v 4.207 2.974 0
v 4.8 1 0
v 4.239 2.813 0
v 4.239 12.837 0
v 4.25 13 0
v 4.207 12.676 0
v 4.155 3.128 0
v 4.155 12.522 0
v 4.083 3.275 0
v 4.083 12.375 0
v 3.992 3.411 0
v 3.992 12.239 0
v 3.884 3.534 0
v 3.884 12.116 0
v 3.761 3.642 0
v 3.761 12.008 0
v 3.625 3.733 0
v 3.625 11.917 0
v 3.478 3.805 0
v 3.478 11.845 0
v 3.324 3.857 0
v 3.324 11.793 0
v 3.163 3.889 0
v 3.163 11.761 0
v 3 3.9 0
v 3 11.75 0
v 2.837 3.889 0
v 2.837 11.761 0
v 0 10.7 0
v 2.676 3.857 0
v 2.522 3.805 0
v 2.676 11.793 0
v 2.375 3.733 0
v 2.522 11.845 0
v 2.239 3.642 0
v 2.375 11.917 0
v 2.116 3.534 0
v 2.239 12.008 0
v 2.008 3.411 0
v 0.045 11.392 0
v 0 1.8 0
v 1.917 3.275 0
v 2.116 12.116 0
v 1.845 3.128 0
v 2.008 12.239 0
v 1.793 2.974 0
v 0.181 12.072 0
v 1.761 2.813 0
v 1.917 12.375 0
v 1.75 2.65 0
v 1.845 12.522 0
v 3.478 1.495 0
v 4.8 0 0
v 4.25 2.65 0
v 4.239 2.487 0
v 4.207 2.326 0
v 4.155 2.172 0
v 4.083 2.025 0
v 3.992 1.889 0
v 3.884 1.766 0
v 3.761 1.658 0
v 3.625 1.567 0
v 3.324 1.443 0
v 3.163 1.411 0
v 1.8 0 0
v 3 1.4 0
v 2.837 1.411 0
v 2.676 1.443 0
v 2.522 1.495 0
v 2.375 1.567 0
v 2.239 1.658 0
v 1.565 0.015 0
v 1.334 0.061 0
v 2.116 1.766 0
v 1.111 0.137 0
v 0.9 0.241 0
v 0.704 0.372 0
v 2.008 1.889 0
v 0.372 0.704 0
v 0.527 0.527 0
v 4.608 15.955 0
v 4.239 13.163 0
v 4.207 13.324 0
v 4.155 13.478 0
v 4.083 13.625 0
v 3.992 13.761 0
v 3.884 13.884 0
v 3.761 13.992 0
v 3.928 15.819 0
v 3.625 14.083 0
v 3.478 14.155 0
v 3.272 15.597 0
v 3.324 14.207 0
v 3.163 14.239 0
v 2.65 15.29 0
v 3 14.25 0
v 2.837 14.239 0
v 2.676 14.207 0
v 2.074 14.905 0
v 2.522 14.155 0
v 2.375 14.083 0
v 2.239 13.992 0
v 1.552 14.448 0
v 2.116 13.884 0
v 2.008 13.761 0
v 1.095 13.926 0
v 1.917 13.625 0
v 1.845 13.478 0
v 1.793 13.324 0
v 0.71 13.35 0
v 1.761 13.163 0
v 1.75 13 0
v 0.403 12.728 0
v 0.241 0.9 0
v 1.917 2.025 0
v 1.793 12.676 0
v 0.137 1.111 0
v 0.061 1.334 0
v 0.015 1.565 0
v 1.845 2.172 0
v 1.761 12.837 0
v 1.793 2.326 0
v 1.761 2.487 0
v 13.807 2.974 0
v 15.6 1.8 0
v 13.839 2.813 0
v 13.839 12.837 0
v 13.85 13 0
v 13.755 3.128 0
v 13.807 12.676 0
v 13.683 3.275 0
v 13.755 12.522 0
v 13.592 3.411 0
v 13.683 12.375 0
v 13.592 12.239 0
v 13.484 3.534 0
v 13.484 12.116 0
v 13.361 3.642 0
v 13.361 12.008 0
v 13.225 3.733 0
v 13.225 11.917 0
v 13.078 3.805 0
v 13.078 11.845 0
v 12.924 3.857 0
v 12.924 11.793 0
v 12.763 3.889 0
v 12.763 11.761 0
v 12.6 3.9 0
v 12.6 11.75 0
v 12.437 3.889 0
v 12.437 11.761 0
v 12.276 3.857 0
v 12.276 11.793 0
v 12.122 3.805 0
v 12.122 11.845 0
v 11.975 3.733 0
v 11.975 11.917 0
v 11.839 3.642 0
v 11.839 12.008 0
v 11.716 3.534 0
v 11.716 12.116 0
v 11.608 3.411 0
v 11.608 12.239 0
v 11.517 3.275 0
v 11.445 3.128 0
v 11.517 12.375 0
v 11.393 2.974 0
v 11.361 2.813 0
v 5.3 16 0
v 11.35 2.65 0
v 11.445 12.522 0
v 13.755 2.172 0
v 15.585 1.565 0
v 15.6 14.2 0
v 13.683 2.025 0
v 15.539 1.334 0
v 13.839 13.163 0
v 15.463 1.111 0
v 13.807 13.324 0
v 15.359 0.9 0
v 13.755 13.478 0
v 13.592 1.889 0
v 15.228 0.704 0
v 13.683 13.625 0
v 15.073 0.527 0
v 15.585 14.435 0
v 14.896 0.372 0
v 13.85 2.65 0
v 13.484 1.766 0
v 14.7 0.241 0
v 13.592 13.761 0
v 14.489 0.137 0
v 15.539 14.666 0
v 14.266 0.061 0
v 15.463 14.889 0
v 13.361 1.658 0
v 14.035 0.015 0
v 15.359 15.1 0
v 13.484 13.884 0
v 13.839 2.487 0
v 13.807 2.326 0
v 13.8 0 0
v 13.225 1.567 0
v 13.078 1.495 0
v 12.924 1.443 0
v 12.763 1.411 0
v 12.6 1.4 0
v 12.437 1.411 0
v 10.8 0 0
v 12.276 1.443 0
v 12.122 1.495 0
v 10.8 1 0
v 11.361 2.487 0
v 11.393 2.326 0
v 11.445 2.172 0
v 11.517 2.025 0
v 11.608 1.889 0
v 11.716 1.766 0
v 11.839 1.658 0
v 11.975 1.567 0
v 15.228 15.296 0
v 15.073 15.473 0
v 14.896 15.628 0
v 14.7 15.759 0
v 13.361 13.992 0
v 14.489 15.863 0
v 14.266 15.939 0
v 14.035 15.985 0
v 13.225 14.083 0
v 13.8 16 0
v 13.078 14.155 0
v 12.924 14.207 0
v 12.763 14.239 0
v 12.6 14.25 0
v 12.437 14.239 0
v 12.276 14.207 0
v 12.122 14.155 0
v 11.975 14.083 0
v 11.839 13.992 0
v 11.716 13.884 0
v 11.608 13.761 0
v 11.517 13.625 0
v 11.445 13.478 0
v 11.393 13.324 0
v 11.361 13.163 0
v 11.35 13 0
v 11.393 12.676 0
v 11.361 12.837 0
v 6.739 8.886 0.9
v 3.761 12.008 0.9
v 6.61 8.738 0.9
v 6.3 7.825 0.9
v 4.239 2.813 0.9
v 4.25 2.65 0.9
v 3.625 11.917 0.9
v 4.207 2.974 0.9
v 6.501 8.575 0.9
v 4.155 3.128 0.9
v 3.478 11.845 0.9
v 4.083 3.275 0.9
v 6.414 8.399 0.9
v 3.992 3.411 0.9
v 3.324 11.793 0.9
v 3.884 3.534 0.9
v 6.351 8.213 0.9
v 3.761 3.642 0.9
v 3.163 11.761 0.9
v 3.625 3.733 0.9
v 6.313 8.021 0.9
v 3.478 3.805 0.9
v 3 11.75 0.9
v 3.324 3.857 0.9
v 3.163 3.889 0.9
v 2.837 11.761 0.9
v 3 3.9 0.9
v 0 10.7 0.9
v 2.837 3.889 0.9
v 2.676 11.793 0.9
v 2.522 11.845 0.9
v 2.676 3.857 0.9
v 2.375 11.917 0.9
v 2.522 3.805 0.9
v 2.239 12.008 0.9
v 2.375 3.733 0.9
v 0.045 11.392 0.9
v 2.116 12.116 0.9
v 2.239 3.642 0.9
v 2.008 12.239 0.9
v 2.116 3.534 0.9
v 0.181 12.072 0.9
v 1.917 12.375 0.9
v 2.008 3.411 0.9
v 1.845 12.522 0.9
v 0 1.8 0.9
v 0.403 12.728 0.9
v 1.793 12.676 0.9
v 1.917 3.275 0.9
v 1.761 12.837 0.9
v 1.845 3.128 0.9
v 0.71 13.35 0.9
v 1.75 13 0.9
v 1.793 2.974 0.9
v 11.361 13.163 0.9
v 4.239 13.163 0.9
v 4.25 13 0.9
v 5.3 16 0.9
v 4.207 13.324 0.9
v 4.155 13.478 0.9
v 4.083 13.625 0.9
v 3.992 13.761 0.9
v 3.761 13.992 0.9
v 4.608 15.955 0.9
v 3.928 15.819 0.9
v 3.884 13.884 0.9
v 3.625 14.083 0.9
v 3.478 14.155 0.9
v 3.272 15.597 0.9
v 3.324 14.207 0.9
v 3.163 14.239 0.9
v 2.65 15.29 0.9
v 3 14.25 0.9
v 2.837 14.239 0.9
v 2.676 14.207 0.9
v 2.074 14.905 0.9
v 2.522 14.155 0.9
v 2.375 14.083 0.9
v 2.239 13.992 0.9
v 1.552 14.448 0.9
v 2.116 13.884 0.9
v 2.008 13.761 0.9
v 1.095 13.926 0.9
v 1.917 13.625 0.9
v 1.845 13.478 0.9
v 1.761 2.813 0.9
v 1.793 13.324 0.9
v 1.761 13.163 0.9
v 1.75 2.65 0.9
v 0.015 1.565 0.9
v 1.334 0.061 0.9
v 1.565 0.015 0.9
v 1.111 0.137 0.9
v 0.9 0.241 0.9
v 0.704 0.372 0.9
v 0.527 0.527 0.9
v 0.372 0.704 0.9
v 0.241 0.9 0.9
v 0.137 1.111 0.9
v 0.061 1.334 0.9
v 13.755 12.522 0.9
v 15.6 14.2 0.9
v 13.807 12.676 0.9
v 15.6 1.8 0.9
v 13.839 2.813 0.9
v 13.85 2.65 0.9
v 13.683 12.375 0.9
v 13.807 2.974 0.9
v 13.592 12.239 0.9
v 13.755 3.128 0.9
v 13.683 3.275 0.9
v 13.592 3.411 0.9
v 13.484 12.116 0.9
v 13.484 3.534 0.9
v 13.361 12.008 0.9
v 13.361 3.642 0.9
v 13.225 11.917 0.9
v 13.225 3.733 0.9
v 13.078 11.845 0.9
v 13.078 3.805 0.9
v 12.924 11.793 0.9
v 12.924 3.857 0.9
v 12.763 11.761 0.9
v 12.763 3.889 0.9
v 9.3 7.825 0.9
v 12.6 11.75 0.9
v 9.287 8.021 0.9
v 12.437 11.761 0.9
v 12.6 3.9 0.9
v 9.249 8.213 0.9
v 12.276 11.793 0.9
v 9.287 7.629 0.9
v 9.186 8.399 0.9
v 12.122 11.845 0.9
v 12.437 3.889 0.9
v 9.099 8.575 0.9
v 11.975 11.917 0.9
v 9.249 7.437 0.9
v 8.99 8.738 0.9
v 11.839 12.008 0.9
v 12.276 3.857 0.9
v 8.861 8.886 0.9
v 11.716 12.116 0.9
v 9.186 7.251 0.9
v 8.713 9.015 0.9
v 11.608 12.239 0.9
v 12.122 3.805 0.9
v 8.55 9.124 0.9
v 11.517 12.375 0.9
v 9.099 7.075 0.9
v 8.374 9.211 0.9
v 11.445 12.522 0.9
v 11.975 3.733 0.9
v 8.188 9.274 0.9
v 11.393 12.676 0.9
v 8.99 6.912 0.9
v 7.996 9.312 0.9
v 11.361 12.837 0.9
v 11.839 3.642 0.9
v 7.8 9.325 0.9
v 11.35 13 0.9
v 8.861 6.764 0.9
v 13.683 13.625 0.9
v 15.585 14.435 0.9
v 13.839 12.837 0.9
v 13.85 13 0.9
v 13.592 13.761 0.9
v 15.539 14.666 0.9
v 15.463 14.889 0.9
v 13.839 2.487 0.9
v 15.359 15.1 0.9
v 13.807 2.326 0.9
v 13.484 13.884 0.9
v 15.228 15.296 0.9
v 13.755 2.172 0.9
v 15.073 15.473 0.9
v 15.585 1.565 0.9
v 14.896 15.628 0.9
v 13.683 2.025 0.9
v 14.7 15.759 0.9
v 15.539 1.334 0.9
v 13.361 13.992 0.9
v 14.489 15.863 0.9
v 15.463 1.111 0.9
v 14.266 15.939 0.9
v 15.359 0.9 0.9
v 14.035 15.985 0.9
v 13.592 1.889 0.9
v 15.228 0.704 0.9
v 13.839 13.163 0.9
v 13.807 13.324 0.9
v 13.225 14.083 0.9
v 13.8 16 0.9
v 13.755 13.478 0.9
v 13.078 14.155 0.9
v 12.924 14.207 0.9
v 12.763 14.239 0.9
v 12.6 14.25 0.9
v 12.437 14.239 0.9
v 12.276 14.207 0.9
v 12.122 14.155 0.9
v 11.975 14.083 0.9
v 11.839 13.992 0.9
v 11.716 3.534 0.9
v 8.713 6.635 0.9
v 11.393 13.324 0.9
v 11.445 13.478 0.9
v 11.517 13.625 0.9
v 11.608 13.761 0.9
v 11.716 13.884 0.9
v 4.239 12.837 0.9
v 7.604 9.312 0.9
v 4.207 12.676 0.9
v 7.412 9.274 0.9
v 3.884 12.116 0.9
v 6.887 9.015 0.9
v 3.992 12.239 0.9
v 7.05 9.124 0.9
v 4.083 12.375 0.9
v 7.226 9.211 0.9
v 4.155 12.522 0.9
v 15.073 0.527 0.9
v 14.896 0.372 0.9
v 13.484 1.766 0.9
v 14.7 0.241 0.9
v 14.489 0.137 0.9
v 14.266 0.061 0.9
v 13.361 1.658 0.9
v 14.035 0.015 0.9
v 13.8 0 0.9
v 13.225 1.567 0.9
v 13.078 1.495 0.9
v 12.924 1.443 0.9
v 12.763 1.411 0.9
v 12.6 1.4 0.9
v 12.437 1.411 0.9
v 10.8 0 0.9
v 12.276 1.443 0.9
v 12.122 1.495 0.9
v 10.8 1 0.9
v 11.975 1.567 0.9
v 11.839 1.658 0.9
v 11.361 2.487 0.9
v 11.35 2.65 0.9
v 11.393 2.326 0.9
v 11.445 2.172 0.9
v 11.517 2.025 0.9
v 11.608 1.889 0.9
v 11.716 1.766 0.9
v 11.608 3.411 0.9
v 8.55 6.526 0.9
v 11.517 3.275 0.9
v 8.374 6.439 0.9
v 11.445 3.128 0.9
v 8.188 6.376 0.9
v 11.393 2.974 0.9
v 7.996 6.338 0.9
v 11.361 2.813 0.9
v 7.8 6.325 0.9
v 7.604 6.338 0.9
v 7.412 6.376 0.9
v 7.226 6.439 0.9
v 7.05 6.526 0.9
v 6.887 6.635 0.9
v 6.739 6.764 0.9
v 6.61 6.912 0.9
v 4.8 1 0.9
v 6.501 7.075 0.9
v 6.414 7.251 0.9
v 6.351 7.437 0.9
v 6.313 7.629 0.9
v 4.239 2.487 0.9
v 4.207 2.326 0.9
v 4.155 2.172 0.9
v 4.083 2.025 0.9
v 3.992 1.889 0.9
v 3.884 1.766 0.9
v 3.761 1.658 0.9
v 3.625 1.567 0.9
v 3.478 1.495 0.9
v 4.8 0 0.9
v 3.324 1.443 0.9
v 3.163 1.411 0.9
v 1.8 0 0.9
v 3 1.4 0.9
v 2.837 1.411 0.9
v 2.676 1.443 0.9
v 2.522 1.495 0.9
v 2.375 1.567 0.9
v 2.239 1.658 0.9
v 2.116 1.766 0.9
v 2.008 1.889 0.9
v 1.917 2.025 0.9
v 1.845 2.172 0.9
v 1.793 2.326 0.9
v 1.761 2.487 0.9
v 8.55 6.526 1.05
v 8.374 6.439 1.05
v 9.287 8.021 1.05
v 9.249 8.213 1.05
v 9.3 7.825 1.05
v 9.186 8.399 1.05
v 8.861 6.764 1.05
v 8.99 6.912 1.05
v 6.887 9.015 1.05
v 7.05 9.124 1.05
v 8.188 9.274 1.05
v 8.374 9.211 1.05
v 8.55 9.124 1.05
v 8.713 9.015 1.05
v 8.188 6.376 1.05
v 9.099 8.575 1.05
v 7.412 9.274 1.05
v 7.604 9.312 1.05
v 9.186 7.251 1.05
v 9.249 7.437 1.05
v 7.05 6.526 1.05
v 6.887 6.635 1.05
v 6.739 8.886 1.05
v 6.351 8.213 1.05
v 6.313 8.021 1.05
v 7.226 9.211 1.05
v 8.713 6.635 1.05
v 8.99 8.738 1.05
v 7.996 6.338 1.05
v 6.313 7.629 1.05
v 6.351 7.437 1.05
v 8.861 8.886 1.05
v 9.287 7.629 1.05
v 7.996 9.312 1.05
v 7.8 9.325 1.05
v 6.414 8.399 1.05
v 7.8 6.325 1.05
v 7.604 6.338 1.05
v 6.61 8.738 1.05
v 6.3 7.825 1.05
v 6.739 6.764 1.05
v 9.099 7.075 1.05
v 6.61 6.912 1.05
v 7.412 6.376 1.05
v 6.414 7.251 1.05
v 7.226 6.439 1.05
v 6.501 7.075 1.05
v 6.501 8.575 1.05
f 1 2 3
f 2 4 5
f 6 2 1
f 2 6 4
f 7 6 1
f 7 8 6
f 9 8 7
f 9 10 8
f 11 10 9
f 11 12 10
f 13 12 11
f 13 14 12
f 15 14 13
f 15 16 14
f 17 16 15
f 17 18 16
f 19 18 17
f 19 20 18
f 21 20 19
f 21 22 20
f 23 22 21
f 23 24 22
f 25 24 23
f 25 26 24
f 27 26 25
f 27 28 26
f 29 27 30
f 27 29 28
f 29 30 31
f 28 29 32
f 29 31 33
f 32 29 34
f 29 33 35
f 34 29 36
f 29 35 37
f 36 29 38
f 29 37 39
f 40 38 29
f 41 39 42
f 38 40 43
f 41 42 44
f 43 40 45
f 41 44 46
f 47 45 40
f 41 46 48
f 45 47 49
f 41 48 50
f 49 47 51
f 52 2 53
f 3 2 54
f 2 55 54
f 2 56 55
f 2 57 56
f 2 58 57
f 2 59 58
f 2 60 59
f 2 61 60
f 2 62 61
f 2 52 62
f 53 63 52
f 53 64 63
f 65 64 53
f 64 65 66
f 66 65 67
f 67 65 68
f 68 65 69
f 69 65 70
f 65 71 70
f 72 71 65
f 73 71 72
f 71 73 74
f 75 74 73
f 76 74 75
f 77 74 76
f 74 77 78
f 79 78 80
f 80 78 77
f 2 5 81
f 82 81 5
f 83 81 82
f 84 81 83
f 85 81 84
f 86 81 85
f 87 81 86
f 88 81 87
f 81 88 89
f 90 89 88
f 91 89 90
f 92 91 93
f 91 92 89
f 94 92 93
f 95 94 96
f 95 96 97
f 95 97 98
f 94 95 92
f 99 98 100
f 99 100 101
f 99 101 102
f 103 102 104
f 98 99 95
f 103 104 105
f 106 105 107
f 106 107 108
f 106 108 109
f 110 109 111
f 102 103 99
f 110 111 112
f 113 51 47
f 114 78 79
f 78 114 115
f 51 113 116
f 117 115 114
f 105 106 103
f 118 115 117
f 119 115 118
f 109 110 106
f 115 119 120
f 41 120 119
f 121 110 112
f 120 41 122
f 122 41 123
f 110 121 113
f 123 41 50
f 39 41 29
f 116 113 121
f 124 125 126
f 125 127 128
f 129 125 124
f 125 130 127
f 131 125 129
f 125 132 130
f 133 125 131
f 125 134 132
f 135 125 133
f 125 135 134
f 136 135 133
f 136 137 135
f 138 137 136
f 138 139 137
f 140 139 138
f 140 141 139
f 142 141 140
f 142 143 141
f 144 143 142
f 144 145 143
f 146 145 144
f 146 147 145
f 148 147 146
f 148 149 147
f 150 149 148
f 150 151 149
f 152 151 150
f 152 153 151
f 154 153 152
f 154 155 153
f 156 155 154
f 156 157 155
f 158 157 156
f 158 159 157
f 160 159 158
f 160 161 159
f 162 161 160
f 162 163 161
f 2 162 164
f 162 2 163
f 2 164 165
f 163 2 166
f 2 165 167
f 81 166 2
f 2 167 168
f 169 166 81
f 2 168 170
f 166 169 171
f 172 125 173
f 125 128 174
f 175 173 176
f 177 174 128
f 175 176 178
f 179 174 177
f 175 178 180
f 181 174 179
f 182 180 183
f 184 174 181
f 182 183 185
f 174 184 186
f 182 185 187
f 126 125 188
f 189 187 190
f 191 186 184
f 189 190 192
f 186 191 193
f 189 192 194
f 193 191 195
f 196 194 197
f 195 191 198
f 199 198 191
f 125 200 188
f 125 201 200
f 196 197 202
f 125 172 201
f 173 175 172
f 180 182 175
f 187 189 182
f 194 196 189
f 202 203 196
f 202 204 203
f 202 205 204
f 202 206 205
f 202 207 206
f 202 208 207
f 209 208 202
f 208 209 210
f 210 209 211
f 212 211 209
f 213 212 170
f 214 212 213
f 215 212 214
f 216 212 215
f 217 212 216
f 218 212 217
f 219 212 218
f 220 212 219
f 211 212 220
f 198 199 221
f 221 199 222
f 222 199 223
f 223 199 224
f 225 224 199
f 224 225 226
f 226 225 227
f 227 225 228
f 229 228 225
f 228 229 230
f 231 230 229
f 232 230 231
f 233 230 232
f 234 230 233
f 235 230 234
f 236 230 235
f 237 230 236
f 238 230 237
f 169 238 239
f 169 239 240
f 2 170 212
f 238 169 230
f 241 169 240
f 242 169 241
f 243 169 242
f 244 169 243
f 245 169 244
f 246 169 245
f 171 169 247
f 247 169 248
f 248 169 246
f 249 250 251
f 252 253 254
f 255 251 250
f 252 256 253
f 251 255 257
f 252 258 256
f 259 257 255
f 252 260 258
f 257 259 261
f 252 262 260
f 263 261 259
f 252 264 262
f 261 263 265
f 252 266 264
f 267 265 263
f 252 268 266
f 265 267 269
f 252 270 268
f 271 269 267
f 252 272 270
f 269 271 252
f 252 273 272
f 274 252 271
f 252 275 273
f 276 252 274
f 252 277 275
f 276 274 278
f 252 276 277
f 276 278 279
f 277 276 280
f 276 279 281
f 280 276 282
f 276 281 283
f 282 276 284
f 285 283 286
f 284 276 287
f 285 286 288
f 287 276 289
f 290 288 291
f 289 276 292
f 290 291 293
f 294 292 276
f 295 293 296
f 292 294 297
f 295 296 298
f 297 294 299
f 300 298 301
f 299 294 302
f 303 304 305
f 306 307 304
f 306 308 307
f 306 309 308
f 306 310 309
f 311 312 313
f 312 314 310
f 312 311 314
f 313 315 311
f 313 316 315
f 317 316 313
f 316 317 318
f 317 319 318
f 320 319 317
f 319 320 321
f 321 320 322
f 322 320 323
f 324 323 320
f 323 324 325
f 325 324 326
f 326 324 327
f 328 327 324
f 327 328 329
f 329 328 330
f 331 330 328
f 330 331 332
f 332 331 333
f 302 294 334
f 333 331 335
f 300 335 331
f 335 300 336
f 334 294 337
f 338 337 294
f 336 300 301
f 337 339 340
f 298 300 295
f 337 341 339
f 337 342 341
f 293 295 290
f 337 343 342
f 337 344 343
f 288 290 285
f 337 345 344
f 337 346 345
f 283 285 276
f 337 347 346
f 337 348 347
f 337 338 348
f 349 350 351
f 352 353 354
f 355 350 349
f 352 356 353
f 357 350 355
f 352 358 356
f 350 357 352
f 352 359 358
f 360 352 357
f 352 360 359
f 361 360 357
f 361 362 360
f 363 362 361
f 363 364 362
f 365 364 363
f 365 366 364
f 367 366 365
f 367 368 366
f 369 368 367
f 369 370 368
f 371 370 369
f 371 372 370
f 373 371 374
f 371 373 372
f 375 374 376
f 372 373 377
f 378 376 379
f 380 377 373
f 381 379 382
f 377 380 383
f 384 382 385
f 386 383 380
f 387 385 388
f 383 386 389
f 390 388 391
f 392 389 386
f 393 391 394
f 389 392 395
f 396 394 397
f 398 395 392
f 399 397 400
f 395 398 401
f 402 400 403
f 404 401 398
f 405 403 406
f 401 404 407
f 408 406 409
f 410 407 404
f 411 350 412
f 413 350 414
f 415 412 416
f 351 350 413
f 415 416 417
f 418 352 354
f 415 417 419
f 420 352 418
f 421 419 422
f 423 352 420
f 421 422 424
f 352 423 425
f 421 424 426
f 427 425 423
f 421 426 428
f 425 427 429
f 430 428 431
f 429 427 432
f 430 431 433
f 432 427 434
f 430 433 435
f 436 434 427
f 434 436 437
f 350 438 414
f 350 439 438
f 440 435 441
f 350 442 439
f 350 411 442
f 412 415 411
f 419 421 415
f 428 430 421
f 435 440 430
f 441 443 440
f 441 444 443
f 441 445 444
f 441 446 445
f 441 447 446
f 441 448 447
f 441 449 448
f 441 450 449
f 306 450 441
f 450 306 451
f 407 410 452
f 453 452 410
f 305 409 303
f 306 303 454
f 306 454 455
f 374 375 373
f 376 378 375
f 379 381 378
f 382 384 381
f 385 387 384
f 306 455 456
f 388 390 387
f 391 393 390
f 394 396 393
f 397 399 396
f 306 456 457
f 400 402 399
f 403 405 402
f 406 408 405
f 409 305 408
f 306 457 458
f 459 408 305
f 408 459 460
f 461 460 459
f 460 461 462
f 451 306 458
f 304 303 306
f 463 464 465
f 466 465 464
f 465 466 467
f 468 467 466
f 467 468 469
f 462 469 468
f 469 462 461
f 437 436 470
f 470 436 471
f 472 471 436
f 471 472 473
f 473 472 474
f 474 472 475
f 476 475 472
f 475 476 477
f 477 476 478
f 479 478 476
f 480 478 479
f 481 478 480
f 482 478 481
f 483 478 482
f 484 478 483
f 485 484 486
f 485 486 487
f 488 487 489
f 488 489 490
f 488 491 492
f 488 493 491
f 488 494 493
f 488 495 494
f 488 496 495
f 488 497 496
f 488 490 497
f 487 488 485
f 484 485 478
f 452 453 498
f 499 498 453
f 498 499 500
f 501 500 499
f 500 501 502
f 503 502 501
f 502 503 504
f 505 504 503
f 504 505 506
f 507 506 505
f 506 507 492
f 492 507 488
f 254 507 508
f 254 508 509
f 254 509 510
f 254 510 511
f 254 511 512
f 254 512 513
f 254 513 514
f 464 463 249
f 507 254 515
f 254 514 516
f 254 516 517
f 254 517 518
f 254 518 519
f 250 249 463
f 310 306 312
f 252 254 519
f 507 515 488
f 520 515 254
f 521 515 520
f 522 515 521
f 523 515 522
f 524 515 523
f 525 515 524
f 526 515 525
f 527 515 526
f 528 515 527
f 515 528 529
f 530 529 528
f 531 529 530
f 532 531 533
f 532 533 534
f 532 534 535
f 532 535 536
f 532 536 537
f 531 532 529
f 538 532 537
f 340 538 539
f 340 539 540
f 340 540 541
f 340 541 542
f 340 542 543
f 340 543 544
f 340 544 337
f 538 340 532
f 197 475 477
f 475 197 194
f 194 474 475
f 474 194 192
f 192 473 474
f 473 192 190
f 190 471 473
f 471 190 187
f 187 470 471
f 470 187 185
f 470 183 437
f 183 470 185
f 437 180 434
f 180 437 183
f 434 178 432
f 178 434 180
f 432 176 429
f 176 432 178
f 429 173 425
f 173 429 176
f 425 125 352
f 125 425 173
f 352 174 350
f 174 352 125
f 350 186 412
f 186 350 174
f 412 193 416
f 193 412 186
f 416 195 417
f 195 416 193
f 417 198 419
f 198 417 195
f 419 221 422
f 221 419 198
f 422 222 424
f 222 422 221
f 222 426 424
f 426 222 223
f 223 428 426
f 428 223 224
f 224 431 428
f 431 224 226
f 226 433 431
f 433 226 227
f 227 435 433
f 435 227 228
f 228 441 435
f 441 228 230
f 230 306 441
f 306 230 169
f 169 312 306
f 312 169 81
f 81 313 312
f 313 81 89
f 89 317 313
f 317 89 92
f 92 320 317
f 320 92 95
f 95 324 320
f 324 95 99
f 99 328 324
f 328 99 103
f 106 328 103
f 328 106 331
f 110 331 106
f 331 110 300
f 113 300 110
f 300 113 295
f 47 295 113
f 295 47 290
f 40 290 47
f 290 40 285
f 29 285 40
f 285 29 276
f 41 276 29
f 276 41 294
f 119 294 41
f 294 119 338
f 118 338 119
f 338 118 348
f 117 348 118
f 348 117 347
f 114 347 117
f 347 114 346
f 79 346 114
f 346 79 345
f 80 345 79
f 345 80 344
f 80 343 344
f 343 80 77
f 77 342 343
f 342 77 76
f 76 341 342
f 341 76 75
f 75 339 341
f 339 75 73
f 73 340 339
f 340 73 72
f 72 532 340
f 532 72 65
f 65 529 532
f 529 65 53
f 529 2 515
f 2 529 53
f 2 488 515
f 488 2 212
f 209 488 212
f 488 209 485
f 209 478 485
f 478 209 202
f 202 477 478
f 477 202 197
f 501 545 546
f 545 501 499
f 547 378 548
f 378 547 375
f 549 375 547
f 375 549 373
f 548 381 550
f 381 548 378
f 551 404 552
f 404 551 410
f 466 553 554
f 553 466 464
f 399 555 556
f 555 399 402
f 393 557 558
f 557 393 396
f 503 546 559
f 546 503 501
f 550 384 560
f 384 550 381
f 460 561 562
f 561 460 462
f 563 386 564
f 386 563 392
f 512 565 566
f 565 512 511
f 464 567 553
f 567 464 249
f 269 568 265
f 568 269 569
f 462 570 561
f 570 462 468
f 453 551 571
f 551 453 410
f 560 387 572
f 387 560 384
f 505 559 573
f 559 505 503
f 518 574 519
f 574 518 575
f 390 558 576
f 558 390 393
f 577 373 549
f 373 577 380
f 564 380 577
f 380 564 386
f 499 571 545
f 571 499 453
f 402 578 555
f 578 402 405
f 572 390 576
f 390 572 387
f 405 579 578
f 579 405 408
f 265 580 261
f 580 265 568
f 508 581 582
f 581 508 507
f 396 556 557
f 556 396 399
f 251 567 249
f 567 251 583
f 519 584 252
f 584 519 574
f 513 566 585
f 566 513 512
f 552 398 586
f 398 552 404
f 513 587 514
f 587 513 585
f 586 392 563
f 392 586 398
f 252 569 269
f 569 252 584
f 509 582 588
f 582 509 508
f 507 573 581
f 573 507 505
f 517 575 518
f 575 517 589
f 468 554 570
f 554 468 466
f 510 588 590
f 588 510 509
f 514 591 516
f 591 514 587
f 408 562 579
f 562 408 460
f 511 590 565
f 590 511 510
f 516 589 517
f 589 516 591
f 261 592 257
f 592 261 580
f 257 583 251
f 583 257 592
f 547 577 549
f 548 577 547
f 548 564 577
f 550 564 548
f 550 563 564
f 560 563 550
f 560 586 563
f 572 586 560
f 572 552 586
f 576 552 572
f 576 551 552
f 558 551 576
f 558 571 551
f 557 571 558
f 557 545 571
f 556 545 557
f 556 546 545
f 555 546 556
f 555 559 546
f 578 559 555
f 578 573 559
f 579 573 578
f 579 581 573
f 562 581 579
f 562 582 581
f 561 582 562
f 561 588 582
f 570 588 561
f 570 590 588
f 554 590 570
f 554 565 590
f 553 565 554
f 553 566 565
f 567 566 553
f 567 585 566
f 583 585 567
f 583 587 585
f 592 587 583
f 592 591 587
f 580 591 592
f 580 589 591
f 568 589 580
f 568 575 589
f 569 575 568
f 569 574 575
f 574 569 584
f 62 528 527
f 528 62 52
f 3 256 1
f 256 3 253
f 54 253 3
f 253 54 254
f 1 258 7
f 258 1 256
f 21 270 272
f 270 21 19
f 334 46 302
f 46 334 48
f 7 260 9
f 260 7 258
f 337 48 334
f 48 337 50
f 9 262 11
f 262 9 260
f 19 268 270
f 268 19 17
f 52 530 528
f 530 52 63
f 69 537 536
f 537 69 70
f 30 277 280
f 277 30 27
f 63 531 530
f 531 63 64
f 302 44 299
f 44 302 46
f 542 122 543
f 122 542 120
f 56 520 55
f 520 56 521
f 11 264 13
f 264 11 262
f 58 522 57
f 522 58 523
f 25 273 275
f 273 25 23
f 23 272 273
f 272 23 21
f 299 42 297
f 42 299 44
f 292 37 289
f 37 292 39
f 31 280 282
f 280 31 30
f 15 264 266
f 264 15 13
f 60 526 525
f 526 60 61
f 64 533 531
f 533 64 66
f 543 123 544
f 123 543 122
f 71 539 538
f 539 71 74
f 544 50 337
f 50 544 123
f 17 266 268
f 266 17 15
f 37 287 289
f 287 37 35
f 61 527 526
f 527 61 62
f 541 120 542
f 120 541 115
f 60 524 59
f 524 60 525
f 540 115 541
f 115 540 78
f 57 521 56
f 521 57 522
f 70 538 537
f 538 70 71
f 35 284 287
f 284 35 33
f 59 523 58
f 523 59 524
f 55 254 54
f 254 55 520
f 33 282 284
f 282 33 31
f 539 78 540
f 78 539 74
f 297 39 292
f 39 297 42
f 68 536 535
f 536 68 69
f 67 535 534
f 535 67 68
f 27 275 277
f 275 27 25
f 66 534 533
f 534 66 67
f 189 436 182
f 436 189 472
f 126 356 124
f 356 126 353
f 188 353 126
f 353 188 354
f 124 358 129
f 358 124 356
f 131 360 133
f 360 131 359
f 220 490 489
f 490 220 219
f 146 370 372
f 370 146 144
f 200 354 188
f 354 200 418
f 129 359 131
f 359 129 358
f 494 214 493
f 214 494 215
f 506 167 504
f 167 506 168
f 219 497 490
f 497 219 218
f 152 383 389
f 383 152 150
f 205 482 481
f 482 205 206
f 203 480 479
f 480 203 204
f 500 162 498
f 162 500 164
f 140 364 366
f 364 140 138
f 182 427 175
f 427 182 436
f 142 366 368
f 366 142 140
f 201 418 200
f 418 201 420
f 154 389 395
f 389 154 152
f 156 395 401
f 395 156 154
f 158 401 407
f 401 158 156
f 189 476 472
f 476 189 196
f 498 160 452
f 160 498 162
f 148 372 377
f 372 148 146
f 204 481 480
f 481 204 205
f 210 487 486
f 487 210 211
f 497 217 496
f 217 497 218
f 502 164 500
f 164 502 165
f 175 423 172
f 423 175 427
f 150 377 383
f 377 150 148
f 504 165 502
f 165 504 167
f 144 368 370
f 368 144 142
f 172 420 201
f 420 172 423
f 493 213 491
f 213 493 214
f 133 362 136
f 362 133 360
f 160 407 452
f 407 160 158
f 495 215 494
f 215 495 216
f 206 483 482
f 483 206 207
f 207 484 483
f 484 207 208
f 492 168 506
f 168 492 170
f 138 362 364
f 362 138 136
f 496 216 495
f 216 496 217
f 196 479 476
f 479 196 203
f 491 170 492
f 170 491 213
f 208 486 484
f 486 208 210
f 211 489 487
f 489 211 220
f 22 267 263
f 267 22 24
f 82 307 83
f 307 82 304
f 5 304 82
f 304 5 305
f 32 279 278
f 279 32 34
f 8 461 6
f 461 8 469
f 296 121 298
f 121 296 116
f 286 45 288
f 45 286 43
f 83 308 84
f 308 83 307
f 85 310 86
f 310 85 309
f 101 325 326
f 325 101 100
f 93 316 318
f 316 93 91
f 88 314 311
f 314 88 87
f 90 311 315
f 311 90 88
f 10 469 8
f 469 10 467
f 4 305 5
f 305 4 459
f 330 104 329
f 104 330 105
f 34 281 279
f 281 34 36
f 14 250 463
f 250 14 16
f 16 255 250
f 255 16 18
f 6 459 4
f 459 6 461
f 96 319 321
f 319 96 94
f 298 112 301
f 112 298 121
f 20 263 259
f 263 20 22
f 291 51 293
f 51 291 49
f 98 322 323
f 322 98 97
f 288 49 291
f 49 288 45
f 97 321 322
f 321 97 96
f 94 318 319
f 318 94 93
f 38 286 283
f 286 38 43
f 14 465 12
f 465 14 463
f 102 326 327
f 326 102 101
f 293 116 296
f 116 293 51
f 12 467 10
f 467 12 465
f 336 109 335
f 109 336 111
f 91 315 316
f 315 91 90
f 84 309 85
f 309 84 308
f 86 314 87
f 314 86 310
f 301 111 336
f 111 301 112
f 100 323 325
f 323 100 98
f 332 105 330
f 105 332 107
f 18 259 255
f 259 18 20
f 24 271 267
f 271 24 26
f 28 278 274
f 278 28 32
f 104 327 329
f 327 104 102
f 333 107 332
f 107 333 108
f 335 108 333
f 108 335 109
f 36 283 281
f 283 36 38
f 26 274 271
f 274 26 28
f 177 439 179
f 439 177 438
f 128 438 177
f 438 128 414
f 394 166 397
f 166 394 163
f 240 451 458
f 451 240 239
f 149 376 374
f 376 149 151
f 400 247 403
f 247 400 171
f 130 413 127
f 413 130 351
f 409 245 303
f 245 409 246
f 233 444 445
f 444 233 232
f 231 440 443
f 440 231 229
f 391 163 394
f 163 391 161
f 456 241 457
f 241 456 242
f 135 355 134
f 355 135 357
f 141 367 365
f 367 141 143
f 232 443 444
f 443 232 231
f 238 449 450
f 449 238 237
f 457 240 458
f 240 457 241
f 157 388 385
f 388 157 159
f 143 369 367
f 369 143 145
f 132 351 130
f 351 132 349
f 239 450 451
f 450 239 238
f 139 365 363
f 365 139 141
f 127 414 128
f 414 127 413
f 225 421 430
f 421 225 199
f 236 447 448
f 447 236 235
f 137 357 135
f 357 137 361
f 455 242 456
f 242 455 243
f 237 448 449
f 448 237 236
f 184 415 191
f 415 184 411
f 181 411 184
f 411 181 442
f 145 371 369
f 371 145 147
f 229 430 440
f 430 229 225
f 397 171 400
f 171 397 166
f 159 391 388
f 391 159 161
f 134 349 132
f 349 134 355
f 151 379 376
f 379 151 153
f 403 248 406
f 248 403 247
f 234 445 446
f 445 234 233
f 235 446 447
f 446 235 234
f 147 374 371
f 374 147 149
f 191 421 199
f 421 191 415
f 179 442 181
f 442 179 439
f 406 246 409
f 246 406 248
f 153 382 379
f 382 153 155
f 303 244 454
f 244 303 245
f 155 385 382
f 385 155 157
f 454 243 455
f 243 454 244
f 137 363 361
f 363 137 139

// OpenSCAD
// file: touchid_params.scad
// ============================================================
// Touch ID モジュール取付プレート + 十字フット のパラメータ
// 座標系: 上から見た形 / 原点=外形バウンディングボックスの南西角 / +Z=天面側
// 寸法はモジュール実物に合わせた実測値
// ============================================================

// ---------- プレート外形 ----------
touchid_plate_w = 15.6;   // 幅
touchid_plate_d = 16.0;   // 奥行き
touchid_plate_t = 0.9;    // 板厚(ネジ穴が貫通する厚み)
touchid_r_corner = 1.8;   // 南西・南東・北東の角R
touchid_r_nw     = 5.3;   // 北西の角R(ここだけ大きい)

// 南辺の切欠き(ケーブル逃げ)
touchid_notch_x  = [4.8, 10.8];
touchid_notch_d  = 1.0;

// ---------- ネジ穴 ----------
// 超低頭ネジ。軸φ1.8が通り、頭φ2.72がプレート裏に露出する
touchid_hole_d = 2.5;     // 通し穴。φ2.7では頭が座らず抜ける
touchid_head_d = 2.72;    // 頭径(実測)
touchid_hole_x = [3.0, 12.6];
touchid_hole_y = [2.65, 13.0];

// ---------- 天面のボス(モジュールの当たり面) ----------
touchid_boss_d = 3.0;
touchid_boss_h = 0.15;

// ---------- 十字フット ----------
touchid_foot_h        = 2.0;   // プレート裏に噛ませるスペーサ厚
touchid_foot_head_clr = 0.64;  // ネジ頭の外周からフットまでの逃げ
touchid_foot_fillet   = 1.0;   // 十字の内隅R(応力集中よけ)
touchid_foot_edge_clr = 0.3;   // Y方向バー端をプレート外形から控える量
touchid_foot_xbar     = [[0, 15.1], 3.0];  // [Xの範囲, ネジ列中心からの半幅]

// ---------- 導出 ----------
touchid_holes = [for (y = touchid_hole_y, x = touchid_hole_x) [x, y]];
touchid_hole_cx = (touchid_hole_x[0] + touchid_hole_x[1]) / 2;
touchid_hole_cy = (touchid_hole_y[0] + touchid_hole_y[1]) / 2;
// 穴中心から確保すべき逃げ半径(ネジ穴ではなく「裏に出る頭」で決まる)
touchid_head_r = touchid_head_d / 2 + touchid_foot_head_clr;
// file: ../params.scad
// ============================================================
// Keyball61 ラップボード 共通パラメータ (v4で使用する項目のみ)
// 座標系: X+ = 右(東), Y+ = 奥(北), Z+ = 上
// 組立座標系(グローバル): 中心 x=0, 手前が y小
// 旧v2(固定式楔)・v3(中空モジュール)のパラメータはgit履歴を参照
// ============================================================

clr = 0.35;           // はめあいクリアランス(片側)

// ---------- 全体レイアウト ----------
splay        = 10;    // ハの字角(固定)。変更したら全パーツ再印刷
tent_angle   = 7;     // テンティング角(内側が高い)
kb_corner_x  = 45;    // キーボードブロック後内側コーナーの中心からの距離
                      // (v4は v4_corner_x = kb_corner_x - 25 を使用)
kb_corner_y  = 238;   // 同コーナーのY

// ---------- キーボード搭載部 ----------
kb_wall      = 6;     // アクリル外形の周囲マージン(外形の配置オフセット)
wedge_t0     = 6;     // 楔面の基準肉厚(lib.scadの傾斜面定義で使用)
plate_t      = 2;     // 取付プレート厚(=アクリル板厚。純正ネジ長がそのまま使える)
pocket_depth = 4.6;   // lib.scadの座面高さ定義で使用

// ---------- パームレスト ----------
palm_w       = 108;   // パームレスト幅
palm_x0      = 2.5;   // パームの外側エッジ位置(kbフレームx)
palm_d       = 88;    // 同奥行き
palm_overlap = 3;     // キーボードブロックへの食い込み
palm_r       = 18;    // 角R

// ---------- 穴径 ----------
ball_hole_d  = 12;    // ボール取出し穴(アクリルは11.3)
m2_hole_d  = 2.4;     // M2クリアランス(プレート側)
bc_hole_d  = 2.8;     // ボールケースネジ(プレート側, アクリルは2.36)

// M3 (ジョイント・カバー固定)
m3_hole_d  = 3.4;
m3_cs_d    = 6.8;     // 皿ざぐり径
m3_nut_af  = 5.8;     // 六角ナットポケット対辺(M3ナット5.5+0.3)
m3_nut_t   = 2.9;     // 同深さ

$fn = 48;
// file: touchid_plate.scad
// Touch ID モジュール取付プレート
// 底面が完全な平面なので、そのままベタ置きで印刷できる。
// 天面中央のボスは0.15mmしかないため積層0.15mm以下で印刷すること。
include <../params.scad>
include <touchid_params.scad>

// 外形: 角Rの異なる丸角矩形 - 南辺の切欠き
module touchid_outline_2d() {
    rc = touchid_r_corner;
    difference() {
        hull() {
            translate([rc, rc])                              circle(r = rc);
            translate([touchid_plate_w - rc, rc])             circle(r = rc);
            translate([touchid_plate_w - rc, touchid_plate_d - rc]) circle(r = rc);
            translate([touchid_r_nw, touchid_plate_d - touchid_r_nw])
                circle(r = touchid_r_nw);
        }
        translate([touchid_notch_x[0], -1])
            square([touchid_notch_x[1] - touchid_notch_x[0], 1 + touchid_notch_d]);
    }
}

module touchid_plate(hole_d = touchid_hole_d) {
    difference() {
        union() {
            linear_extrude(touchid_plate_t) touchid_outline_2d();
            translate([touchid_hole_cx, touchid_hole_cy, touchid_plate_t])
                cylinder(d = touchid_boss_d, h = touchid_boss_h);
        }
        for (h = touchid_holes)
            translate([h[0], h[1], -1])
                cylinder(d = hole_d, h = touchid_plate_t + 2);
    }
}
// main file
include <touchid_plate.scad>
// 底面(フットが付く側)をベッドに置いて印刷。天面のボスは0.15mmの島なのでサポート不要。
// ボスを再現するため積層は0.15mm以下にすること
touchid_plate();
